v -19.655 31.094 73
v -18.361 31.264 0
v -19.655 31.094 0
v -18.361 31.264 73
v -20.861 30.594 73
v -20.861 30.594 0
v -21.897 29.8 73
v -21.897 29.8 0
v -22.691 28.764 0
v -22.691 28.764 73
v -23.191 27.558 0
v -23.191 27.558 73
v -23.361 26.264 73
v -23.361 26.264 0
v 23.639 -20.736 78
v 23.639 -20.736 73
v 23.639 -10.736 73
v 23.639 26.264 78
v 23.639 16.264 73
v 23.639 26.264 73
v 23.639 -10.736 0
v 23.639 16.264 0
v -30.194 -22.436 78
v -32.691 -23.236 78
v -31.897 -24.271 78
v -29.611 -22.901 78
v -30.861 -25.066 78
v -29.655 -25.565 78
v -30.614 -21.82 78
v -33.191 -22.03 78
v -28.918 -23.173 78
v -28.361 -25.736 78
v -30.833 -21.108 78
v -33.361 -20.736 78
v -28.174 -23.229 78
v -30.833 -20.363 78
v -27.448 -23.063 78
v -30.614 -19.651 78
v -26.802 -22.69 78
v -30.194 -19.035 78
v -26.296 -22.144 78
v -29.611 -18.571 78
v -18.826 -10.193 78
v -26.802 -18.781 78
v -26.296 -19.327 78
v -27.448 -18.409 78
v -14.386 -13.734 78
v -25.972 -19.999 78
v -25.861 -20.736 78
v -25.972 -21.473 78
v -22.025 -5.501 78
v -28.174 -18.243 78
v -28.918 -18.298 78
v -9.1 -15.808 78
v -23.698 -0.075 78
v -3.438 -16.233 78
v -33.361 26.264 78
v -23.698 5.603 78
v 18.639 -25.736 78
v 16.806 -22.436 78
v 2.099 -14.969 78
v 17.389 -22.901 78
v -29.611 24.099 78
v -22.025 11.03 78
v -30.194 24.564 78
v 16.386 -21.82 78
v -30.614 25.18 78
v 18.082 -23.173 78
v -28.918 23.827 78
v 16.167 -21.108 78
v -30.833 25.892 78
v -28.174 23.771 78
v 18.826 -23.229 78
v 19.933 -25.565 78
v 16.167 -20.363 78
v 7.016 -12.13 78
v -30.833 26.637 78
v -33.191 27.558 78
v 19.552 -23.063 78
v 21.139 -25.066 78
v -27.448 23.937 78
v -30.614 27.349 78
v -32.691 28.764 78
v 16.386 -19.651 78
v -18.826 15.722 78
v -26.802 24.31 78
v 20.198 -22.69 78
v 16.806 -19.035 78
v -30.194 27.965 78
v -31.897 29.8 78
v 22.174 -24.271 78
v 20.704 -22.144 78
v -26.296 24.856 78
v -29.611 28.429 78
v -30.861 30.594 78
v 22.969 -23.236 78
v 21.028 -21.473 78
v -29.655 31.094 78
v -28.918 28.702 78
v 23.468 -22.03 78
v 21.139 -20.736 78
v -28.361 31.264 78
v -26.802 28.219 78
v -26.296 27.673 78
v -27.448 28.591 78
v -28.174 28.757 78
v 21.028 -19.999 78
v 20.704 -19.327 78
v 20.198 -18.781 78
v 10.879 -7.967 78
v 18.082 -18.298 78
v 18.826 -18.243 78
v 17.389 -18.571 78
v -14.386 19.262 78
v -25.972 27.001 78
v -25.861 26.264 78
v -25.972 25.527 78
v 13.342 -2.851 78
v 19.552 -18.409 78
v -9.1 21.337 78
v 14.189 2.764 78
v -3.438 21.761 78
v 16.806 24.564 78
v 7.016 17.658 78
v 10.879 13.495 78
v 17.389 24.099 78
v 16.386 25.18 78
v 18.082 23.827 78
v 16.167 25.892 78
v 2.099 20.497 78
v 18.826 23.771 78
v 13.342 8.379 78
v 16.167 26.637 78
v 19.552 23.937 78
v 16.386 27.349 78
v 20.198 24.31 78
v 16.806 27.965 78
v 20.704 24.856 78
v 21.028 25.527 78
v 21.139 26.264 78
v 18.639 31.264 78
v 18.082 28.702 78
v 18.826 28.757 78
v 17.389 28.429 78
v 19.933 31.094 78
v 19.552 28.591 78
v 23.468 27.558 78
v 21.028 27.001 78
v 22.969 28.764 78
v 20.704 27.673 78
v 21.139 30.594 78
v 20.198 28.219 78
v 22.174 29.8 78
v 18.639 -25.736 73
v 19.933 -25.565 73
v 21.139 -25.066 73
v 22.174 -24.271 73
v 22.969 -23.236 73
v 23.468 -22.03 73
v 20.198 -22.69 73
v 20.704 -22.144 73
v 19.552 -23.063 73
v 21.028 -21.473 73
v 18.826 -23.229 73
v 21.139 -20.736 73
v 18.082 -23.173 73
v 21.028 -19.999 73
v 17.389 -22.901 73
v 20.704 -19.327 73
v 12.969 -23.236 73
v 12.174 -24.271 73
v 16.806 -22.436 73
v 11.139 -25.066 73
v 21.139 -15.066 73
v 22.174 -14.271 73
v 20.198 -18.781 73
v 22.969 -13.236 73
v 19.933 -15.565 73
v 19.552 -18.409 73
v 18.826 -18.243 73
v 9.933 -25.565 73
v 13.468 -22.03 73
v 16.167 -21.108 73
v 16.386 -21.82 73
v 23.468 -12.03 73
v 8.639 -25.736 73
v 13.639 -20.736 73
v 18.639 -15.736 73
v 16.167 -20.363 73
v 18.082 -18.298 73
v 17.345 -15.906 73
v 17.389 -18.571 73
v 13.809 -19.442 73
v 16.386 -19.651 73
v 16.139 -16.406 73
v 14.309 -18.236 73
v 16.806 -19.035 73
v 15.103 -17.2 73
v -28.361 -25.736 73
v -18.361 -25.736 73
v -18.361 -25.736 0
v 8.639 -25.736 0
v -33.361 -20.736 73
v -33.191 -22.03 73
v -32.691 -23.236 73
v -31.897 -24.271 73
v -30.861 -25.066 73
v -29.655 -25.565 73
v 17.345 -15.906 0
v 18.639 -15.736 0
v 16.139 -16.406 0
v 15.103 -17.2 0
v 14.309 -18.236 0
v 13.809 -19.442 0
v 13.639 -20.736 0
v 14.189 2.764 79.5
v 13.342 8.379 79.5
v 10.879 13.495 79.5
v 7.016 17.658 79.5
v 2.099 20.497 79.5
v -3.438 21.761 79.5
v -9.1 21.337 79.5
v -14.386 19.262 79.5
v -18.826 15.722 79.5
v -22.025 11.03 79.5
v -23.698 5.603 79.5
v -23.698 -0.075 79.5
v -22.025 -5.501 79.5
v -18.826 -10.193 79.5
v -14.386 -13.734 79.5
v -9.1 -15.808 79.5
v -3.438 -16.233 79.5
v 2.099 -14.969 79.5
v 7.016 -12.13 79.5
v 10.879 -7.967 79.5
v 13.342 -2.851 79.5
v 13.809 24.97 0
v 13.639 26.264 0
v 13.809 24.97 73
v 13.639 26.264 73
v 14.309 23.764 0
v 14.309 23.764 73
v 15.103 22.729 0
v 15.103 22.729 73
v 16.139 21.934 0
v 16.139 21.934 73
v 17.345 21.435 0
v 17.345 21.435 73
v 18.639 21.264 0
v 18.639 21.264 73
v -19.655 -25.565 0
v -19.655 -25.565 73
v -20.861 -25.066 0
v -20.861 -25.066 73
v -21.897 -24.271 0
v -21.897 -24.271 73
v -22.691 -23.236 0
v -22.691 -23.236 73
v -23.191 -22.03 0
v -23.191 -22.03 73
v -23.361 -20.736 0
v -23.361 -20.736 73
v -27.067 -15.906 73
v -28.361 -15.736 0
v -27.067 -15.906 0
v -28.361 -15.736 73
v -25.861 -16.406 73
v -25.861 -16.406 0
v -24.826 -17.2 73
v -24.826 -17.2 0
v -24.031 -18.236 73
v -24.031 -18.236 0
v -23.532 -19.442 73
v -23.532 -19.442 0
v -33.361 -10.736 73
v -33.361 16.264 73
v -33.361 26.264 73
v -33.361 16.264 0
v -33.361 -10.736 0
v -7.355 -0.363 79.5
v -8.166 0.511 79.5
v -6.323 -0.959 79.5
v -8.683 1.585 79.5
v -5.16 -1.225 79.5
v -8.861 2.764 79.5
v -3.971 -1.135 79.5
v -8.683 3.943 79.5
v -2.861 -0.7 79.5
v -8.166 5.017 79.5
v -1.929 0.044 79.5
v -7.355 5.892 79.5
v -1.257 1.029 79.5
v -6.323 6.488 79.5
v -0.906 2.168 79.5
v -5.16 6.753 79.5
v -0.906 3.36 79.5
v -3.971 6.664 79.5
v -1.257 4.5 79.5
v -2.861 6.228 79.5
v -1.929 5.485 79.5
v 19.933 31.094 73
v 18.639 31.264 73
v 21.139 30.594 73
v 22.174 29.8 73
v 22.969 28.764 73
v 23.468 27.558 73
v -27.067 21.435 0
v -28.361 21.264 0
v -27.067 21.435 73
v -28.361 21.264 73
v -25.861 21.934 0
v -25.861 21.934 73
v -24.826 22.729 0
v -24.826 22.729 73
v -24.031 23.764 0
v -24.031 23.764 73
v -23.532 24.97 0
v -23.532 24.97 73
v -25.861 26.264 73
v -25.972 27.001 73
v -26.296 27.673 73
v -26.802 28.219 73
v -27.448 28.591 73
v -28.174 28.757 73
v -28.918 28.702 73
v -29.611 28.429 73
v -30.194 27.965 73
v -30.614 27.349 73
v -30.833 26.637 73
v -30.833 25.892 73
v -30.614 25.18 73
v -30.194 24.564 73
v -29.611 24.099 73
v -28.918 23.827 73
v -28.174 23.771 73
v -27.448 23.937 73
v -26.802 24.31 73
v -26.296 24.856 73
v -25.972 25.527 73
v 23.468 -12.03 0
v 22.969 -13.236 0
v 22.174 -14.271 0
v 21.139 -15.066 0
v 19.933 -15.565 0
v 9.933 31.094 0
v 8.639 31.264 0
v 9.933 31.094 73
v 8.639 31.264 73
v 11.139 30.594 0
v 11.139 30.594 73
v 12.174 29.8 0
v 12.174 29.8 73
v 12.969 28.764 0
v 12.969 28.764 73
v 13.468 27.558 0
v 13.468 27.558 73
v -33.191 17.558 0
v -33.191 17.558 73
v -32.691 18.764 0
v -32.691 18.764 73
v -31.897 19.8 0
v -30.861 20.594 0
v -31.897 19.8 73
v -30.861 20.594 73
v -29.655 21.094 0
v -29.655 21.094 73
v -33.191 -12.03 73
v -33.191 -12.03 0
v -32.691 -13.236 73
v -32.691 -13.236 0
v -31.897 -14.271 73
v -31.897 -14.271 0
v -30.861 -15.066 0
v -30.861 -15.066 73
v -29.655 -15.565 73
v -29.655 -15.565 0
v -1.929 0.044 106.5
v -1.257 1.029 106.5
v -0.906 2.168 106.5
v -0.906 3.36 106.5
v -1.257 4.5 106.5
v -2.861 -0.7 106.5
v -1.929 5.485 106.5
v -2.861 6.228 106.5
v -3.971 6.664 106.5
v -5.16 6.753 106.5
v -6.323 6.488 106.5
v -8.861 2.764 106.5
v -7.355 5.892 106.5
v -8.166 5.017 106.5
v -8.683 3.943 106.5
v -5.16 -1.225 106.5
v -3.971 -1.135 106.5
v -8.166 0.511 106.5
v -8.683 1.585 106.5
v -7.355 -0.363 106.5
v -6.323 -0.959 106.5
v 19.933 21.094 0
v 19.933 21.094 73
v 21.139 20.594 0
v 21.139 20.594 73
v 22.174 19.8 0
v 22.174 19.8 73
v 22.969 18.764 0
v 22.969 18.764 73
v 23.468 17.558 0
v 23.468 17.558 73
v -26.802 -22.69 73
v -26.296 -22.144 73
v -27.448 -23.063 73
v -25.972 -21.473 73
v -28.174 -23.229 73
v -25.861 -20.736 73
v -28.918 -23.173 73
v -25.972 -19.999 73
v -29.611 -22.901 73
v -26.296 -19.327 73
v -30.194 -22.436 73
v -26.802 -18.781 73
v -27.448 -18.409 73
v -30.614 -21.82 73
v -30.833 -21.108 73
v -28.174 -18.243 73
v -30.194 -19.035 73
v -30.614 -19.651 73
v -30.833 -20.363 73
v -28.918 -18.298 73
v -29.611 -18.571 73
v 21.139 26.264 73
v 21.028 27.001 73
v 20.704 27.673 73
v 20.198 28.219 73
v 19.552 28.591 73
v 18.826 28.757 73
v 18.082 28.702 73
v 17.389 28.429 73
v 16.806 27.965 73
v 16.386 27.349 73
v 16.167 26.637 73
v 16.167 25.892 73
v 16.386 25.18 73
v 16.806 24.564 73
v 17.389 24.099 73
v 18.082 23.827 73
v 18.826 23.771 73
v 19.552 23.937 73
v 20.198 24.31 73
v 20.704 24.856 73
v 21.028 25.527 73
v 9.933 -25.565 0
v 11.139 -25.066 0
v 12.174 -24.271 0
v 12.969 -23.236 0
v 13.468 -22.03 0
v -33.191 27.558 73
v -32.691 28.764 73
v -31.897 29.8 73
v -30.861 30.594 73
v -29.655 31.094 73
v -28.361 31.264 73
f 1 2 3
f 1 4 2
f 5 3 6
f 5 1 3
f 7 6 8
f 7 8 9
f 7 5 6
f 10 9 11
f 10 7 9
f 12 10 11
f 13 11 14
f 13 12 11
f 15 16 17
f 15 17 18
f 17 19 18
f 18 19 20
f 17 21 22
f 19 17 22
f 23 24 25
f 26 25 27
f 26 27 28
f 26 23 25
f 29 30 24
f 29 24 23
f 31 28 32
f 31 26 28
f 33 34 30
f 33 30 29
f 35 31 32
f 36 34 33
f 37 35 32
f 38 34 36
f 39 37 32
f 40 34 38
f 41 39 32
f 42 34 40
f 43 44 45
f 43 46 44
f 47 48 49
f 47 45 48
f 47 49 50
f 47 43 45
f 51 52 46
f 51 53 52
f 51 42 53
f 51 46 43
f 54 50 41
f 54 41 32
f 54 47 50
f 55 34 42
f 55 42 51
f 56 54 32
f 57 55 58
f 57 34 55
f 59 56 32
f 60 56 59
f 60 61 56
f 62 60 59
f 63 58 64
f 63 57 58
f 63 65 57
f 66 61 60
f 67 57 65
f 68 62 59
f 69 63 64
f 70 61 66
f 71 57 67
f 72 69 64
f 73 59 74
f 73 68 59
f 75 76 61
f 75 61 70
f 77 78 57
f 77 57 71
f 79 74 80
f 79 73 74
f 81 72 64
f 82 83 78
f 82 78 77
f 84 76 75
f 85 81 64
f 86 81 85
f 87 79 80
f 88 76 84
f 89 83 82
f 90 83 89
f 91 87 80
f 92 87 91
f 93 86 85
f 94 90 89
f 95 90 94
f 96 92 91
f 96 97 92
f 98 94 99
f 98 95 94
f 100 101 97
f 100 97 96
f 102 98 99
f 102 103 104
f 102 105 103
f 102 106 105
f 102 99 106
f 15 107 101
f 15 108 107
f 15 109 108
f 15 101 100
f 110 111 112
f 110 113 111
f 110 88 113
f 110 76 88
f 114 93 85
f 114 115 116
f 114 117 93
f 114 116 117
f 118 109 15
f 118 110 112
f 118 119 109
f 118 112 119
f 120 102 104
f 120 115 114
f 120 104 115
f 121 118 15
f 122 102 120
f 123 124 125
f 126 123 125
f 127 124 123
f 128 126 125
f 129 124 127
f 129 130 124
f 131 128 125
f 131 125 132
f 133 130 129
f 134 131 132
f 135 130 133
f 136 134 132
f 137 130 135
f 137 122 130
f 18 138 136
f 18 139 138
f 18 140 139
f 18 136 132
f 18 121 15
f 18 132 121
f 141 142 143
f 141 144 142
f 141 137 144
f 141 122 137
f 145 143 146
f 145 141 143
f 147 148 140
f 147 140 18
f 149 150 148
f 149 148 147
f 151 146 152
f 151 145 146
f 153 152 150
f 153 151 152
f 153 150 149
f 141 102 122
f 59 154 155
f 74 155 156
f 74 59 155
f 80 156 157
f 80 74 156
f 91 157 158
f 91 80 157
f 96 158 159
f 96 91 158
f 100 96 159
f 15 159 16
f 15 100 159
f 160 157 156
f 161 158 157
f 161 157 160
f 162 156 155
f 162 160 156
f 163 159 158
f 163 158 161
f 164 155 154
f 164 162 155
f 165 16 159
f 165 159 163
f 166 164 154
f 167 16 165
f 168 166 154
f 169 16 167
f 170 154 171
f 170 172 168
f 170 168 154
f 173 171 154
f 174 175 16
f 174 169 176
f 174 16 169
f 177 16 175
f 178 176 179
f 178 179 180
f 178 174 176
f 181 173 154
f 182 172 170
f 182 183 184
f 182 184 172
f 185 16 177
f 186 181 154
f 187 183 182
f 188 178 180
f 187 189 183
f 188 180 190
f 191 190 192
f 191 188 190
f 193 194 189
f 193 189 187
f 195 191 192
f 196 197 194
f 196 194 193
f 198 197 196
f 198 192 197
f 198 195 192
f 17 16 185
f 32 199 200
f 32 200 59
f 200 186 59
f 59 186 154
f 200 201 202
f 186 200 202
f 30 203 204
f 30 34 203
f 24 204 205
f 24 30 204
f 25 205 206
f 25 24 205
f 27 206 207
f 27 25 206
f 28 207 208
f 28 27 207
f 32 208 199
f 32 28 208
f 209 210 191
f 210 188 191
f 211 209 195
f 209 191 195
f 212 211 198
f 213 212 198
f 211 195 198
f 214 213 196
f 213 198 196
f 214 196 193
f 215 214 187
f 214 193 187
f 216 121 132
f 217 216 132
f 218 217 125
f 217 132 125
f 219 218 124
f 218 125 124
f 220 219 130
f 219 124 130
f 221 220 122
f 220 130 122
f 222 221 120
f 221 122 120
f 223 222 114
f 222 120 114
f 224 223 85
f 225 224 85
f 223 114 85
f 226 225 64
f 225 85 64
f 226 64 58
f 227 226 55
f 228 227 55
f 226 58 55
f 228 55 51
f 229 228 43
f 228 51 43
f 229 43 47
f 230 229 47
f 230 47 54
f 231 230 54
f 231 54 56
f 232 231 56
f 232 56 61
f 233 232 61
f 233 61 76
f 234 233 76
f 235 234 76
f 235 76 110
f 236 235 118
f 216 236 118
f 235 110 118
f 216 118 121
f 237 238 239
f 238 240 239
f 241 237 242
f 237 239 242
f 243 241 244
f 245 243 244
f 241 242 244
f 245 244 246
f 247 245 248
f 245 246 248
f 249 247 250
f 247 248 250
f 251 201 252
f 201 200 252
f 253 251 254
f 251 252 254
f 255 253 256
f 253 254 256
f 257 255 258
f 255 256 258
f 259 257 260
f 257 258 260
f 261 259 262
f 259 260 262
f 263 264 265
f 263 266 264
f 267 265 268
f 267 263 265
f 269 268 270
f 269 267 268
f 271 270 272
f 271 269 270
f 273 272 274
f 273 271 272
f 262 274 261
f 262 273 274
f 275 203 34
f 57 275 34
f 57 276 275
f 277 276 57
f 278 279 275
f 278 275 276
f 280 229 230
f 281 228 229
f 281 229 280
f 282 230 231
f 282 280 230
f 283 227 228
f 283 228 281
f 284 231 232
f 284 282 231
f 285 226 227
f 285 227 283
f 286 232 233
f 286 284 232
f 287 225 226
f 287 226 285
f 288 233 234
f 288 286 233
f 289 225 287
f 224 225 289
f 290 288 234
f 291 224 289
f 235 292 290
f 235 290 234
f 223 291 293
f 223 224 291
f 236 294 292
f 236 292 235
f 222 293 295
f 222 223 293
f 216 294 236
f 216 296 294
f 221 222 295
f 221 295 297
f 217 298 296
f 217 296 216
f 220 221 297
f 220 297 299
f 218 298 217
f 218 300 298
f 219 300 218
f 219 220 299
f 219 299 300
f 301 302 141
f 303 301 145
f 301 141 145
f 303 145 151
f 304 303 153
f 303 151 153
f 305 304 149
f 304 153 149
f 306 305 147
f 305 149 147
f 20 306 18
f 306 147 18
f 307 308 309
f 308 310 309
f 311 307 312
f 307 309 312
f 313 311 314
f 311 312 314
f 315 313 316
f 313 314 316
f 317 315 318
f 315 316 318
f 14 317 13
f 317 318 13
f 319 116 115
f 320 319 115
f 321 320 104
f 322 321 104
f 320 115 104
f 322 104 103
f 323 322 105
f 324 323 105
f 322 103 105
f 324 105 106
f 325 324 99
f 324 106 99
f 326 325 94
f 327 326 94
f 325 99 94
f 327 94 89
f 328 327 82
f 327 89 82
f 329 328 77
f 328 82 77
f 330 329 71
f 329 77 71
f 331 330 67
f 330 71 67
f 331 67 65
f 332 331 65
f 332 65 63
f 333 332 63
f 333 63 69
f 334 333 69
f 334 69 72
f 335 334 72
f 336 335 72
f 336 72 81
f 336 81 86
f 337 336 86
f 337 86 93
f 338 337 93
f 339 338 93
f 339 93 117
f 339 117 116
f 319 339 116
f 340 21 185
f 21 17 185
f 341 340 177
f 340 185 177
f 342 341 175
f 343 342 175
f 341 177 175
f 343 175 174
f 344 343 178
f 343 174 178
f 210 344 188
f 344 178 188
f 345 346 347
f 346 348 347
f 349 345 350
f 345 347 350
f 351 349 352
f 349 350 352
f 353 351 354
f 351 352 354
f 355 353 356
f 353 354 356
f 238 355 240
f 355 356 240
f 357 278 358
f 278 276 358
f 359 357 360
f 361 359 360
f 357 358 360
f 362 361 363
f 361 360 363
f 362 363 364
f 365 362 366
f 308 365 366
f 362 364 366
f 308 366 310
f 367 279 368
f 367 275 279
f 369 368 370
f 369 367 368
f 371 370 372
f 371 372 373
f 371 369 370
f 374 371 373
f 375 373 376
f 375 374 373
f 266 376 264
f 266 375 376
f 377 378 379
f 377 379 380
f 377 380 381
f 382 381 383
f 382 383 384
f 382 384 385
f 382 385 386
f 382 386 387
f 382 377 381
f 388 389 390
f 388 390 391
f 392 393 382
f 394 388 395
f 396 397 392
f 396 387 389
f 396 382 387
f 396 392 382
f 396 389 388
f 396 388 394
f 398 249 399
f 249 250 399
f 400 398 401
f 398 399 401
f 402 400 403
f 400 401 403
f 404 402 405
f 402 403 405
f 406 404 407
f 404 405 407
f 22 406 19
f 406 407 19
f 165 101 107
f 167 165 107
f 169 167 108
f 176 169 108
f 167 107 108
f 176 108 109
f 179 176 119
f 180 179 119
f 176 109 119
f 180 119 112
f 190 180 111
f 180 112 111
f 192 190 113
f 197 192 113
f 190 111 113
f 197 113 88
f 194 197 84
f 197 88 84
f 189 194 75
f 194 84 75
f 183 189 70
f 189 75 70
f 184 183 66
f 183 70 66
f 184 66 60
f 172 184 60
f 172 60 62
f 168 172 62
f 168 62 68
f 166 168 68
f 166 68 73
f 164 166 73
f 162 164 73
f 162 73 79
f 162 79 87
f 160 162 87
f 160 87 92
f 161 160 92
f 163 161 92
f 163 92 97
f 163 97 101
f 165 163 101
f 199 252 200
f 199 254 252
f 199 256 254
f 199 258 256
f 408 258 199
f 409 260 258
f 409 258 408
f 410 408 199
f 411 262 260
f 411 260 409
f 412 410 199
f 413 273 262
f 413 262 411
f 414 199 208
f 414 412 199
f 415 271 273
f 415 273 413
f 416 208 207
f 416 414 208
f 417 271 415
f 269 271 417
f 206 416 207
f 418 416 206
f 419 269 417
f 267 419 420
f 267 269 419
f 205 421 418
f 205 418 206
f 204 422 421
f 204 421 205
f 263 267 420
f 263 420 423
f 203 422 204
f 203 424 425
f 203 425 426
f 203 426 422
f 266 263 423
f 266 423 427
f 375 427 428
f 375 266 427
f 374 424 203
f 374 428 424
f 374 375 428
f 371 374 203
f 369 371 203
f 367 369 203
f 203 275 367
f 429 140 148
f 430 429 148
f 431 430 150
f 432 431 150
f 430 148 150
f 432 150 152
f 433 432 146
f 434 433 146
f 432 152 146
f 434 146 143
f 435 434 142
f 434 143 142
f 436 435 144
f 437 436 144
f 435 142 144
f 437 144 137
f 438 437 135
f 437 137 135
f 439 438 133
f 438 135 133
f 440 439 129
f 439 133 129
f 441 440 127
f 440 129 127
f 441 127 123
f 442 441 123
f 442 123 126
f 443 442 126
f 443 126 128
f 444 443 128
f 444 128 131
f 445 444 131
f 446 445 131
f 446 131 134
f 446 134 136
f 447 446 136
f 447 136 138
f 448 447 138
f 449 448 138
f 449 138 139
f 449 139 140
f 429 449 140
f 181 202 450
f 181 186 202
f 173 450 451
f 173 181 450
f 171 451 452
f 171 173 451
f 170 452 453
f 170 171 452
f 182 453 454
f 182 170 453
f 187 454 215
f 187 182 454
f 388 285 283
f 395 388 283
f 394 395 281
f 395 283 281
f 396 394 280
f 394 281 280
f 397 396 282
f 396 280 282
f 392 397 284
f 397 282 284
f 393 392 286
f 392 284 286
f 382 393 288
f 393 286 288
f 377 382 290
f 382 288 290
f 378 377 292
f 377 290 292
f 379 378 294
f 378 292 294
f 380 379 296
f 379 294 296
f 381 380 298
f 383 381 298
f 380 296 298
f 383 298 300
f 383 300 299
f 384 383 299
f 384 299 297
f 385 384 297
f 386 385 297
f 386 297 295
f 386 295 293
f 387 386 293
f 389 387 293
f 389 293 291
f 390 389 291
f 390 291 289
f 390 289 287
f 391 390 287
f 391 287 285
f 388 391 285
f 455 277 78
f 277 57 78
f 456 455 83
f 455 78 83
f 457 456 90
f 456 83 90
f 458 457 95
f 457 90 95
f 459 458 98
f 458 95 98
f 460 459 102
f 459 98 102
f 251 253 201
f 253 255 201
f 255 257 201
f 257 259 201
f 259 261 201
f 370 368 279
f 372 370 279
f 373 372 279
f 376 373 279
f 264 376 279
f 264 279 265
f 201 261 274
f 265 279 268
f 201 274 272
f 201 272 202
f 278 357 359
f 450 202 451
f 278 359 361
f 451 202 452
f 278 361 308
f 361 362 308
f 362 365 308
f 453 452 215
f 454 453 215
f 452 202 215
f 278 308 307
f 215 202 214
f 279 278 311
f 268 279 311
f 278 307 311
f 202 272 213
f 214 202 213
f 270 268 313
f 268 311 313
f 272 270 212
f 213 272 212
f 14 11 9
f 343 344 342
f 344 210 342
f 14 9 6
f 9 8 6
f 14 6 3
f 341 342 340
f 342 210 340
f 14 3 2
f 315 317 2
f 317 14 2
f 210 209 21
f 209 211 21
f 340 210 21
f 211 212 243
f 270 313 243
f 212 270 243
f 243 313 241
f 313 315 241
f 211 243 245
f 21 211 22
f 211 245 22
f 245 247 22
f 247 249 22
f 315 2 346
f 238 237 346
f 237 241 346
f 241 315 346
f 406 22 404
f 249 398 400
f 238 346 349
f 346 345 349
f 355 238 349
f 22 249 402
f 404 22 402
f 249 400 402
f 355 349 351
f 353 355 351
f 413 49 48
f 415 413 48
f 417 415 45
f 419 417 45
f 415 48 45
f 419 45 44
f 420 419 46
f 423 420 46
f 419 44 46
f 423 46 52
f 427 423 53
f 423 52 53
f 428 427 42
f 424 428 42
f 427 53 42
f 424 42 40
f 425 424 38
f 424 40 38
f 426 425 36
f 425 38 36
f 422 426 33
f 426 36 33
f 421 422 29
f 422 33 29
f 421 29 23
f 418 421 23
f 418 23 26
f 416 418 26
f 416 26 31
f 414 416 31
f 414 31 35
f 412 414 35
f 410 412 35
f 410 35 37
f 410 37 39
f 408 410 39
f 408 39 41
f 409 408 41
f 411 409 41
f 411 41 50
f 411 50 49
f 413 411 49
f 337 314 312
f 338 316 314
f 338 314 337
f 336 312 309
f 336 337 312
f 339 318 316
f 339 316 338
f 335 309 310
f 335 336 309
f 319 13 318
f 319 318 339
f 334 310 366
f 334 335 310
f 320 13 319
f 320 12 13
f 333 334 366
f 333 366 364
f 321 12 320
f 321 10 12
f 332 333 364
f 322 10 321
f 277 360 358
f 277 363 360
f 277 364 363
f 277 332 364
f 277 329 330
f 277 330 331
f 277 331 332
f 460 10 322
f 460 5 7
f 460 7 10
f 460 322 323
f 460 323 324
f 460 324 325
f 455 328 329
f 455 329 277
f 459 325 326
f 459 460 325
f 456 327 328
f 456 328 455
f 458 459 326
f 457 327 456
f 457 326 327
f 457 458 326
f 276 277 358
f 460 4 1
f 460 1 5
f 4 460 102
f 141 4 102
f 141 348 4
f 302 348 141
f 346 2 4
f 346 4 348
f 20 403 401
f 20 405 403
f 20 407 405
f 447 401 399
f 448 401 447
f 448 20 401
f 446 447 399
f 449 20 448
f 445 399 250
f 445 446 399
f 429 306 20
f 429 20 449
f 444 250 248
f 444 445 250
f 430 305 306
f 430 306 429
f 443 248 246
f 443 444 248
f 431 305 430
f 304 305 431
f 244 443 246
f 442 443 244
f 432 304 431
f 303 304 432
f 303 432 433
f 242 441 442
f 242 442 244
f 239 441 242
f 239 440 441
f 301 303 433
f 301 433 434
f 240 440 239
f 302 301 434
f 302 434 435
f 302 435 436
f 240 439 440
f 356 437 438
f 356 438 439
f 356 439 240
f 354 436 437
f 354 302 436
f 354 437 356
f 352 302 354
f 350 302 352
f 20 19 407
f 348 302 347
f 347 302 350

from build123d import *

# Parameters (mm, degrees)
SKETCH1_W            = 57
SKETCH1_H            = 57
BOSS_EXTRUDE1_DEPTH  = 78
SKETCH2_W            = 10
SKETCH2_H            = 10
CUT_EXTRUDE1_DEPTH   = 73
LPATTERN1_COUNT      = 2
LPATTERN1_PITCH      = 47
LPATTERN1_COUNT_DIR2 = 2
LPATTERN1_PITCH_DIR2 = 47
SKETCH3_R            = 2.5
CUT_EXTRUDE2_DEPTH   = 50
LPATTERN2_COUNT      = 2
LPATTERN2_PITCH      = 47
LPATTERN2_COUNT_DIR2 = 2
LPATTERN2_PITCH_DIR2 = 47
FILLET1_R            = 5
SKETCH5_R            = 19.05
BOSS_EXTRUDE3_DEPTH  = 1.5
SKETCH4_R            = 4
BOSS_EXTRUDE2_DEPTH  = 28.5


with BuildPart() as part:
    # Sketch1 → Boss-Extrude1 (new body)
    with BuildSketch(Plane.XY):
        with Locations((-4.861204013, 2.764214047)):
            Rectangle(SKETCH1_W, SKETCH1_H)
    extrude(amount=BOSS_EXTRUDE1_DEPTH)

    # Sketch2 → Cut-Extrude1 (cut)
    with BuildSketch(Plane(origin=(0, 0, 0), x_dir=(-1, 0, 0), z_dir=(0, 0, -1))):
        with Locations((-18.638795987, 26.264214047)):
            Rectangle(SKETCH2_W, SKETCH2_H)
    cut_extrude1 = extrude(amount=-CUT_EXTRUDE1_DEPTH, mode=Mode.SUBTRACT)

    # LPattern1: Cut-Extrude1 2 × 2
    with Locations(*[(-i * LPATTERN1_PITCH, -j * LPATTERN1_PITCH_DIR2, 0) for i in range(LPATTERN1_COUNT) for j in range(LPATTERN1_COUNT_DIR2) if (i, j) != (0, 0)]):
        add(cut_extrude1, mode=Mode.SUBTRACT)

    # Sketch3 → Cut-Extrude2 (cut)
    with BuildSketch(Plane.XY.offset(78)):
        with Locations((-28.361204013, 26.264214047)):
            Circle(SKETCH3_R)
    cut_extrude2 = extrude(amount=-CUT_EXTRUDE2_DEPTH, mode=Mode.SUBTRACT)

    # LPattern2: Cut-Extrude2 2 × 2
    with Locations(*[(i * LPATTERN2_PITCH, -j * LPATTERN2_PITCH_DIR2, 0) for i in range(LPATTERN2_COUNT) for j in range(LPATTERN2_COUNT_DIR2) if (i, j) != (0, 0)]):
        add(cut_extrude2, mode=Mode.SUBTRACT)

    # Fillet1
    fillet1_edges = [part.edges().sort_by_distance(p)[0] for p in [
        (-33.361204013, 21.264214047, 36.5),
        (-23.361204013, 21.264214047, 36.5),
        (-23.361204013, 31.264214047, 36.5),
        (13.638795987, 31.264214047, 36.5),
        (13.638795987, 21.264214047, 36.5),
        (23.638795987, 21.264214047, 36.5),
        (23.638795987, -25.735785953, 75.5),
        (23.638795987, -15.735785953, 36.5),
        (13.638795987, -15.735785953, 36.5),
        (13.638795987, -25.735785953, 36.5),
        (-23.361204013, -25.735785953, 36.5),
        (-23.361204013, -15.735785953, 36.5),
        (-33.361204013, -15.735785953, 36.5),
        (-33.361204013, -25.735785953, 75.5),
        (-33.361204013, 31.264214047, 75.5),
        (23.638795987, 31.264214047, 75.5),
    ]]
    fillet(fillet1_edges, radius=FILLET1_R - 0.0001)  # a hair under: the kernel refuses the full size

    # Sketch5 → Boss-Extrude3 (add)
    with BuildSketch(Plane.XY.offset(78)):
        with Locations((-4.861204013, 2.764214047)):
            Circle(SKETCH5_R)
    extrude(amount=BOSS_EXTRUDE3_DEPTH)

    # Sketch4 → Boss-Extrude2 (add)
    with BuildSketch(Plane.XY.offset(78)):
        with Locations(Location((-4.861204013, 2.764214047, 0), (0, 0, 180))):
            Circle(SKETCH4_R)
    extrude(amount=BOSS_EXTRUDE2_DEPTH)


solid = part.part
